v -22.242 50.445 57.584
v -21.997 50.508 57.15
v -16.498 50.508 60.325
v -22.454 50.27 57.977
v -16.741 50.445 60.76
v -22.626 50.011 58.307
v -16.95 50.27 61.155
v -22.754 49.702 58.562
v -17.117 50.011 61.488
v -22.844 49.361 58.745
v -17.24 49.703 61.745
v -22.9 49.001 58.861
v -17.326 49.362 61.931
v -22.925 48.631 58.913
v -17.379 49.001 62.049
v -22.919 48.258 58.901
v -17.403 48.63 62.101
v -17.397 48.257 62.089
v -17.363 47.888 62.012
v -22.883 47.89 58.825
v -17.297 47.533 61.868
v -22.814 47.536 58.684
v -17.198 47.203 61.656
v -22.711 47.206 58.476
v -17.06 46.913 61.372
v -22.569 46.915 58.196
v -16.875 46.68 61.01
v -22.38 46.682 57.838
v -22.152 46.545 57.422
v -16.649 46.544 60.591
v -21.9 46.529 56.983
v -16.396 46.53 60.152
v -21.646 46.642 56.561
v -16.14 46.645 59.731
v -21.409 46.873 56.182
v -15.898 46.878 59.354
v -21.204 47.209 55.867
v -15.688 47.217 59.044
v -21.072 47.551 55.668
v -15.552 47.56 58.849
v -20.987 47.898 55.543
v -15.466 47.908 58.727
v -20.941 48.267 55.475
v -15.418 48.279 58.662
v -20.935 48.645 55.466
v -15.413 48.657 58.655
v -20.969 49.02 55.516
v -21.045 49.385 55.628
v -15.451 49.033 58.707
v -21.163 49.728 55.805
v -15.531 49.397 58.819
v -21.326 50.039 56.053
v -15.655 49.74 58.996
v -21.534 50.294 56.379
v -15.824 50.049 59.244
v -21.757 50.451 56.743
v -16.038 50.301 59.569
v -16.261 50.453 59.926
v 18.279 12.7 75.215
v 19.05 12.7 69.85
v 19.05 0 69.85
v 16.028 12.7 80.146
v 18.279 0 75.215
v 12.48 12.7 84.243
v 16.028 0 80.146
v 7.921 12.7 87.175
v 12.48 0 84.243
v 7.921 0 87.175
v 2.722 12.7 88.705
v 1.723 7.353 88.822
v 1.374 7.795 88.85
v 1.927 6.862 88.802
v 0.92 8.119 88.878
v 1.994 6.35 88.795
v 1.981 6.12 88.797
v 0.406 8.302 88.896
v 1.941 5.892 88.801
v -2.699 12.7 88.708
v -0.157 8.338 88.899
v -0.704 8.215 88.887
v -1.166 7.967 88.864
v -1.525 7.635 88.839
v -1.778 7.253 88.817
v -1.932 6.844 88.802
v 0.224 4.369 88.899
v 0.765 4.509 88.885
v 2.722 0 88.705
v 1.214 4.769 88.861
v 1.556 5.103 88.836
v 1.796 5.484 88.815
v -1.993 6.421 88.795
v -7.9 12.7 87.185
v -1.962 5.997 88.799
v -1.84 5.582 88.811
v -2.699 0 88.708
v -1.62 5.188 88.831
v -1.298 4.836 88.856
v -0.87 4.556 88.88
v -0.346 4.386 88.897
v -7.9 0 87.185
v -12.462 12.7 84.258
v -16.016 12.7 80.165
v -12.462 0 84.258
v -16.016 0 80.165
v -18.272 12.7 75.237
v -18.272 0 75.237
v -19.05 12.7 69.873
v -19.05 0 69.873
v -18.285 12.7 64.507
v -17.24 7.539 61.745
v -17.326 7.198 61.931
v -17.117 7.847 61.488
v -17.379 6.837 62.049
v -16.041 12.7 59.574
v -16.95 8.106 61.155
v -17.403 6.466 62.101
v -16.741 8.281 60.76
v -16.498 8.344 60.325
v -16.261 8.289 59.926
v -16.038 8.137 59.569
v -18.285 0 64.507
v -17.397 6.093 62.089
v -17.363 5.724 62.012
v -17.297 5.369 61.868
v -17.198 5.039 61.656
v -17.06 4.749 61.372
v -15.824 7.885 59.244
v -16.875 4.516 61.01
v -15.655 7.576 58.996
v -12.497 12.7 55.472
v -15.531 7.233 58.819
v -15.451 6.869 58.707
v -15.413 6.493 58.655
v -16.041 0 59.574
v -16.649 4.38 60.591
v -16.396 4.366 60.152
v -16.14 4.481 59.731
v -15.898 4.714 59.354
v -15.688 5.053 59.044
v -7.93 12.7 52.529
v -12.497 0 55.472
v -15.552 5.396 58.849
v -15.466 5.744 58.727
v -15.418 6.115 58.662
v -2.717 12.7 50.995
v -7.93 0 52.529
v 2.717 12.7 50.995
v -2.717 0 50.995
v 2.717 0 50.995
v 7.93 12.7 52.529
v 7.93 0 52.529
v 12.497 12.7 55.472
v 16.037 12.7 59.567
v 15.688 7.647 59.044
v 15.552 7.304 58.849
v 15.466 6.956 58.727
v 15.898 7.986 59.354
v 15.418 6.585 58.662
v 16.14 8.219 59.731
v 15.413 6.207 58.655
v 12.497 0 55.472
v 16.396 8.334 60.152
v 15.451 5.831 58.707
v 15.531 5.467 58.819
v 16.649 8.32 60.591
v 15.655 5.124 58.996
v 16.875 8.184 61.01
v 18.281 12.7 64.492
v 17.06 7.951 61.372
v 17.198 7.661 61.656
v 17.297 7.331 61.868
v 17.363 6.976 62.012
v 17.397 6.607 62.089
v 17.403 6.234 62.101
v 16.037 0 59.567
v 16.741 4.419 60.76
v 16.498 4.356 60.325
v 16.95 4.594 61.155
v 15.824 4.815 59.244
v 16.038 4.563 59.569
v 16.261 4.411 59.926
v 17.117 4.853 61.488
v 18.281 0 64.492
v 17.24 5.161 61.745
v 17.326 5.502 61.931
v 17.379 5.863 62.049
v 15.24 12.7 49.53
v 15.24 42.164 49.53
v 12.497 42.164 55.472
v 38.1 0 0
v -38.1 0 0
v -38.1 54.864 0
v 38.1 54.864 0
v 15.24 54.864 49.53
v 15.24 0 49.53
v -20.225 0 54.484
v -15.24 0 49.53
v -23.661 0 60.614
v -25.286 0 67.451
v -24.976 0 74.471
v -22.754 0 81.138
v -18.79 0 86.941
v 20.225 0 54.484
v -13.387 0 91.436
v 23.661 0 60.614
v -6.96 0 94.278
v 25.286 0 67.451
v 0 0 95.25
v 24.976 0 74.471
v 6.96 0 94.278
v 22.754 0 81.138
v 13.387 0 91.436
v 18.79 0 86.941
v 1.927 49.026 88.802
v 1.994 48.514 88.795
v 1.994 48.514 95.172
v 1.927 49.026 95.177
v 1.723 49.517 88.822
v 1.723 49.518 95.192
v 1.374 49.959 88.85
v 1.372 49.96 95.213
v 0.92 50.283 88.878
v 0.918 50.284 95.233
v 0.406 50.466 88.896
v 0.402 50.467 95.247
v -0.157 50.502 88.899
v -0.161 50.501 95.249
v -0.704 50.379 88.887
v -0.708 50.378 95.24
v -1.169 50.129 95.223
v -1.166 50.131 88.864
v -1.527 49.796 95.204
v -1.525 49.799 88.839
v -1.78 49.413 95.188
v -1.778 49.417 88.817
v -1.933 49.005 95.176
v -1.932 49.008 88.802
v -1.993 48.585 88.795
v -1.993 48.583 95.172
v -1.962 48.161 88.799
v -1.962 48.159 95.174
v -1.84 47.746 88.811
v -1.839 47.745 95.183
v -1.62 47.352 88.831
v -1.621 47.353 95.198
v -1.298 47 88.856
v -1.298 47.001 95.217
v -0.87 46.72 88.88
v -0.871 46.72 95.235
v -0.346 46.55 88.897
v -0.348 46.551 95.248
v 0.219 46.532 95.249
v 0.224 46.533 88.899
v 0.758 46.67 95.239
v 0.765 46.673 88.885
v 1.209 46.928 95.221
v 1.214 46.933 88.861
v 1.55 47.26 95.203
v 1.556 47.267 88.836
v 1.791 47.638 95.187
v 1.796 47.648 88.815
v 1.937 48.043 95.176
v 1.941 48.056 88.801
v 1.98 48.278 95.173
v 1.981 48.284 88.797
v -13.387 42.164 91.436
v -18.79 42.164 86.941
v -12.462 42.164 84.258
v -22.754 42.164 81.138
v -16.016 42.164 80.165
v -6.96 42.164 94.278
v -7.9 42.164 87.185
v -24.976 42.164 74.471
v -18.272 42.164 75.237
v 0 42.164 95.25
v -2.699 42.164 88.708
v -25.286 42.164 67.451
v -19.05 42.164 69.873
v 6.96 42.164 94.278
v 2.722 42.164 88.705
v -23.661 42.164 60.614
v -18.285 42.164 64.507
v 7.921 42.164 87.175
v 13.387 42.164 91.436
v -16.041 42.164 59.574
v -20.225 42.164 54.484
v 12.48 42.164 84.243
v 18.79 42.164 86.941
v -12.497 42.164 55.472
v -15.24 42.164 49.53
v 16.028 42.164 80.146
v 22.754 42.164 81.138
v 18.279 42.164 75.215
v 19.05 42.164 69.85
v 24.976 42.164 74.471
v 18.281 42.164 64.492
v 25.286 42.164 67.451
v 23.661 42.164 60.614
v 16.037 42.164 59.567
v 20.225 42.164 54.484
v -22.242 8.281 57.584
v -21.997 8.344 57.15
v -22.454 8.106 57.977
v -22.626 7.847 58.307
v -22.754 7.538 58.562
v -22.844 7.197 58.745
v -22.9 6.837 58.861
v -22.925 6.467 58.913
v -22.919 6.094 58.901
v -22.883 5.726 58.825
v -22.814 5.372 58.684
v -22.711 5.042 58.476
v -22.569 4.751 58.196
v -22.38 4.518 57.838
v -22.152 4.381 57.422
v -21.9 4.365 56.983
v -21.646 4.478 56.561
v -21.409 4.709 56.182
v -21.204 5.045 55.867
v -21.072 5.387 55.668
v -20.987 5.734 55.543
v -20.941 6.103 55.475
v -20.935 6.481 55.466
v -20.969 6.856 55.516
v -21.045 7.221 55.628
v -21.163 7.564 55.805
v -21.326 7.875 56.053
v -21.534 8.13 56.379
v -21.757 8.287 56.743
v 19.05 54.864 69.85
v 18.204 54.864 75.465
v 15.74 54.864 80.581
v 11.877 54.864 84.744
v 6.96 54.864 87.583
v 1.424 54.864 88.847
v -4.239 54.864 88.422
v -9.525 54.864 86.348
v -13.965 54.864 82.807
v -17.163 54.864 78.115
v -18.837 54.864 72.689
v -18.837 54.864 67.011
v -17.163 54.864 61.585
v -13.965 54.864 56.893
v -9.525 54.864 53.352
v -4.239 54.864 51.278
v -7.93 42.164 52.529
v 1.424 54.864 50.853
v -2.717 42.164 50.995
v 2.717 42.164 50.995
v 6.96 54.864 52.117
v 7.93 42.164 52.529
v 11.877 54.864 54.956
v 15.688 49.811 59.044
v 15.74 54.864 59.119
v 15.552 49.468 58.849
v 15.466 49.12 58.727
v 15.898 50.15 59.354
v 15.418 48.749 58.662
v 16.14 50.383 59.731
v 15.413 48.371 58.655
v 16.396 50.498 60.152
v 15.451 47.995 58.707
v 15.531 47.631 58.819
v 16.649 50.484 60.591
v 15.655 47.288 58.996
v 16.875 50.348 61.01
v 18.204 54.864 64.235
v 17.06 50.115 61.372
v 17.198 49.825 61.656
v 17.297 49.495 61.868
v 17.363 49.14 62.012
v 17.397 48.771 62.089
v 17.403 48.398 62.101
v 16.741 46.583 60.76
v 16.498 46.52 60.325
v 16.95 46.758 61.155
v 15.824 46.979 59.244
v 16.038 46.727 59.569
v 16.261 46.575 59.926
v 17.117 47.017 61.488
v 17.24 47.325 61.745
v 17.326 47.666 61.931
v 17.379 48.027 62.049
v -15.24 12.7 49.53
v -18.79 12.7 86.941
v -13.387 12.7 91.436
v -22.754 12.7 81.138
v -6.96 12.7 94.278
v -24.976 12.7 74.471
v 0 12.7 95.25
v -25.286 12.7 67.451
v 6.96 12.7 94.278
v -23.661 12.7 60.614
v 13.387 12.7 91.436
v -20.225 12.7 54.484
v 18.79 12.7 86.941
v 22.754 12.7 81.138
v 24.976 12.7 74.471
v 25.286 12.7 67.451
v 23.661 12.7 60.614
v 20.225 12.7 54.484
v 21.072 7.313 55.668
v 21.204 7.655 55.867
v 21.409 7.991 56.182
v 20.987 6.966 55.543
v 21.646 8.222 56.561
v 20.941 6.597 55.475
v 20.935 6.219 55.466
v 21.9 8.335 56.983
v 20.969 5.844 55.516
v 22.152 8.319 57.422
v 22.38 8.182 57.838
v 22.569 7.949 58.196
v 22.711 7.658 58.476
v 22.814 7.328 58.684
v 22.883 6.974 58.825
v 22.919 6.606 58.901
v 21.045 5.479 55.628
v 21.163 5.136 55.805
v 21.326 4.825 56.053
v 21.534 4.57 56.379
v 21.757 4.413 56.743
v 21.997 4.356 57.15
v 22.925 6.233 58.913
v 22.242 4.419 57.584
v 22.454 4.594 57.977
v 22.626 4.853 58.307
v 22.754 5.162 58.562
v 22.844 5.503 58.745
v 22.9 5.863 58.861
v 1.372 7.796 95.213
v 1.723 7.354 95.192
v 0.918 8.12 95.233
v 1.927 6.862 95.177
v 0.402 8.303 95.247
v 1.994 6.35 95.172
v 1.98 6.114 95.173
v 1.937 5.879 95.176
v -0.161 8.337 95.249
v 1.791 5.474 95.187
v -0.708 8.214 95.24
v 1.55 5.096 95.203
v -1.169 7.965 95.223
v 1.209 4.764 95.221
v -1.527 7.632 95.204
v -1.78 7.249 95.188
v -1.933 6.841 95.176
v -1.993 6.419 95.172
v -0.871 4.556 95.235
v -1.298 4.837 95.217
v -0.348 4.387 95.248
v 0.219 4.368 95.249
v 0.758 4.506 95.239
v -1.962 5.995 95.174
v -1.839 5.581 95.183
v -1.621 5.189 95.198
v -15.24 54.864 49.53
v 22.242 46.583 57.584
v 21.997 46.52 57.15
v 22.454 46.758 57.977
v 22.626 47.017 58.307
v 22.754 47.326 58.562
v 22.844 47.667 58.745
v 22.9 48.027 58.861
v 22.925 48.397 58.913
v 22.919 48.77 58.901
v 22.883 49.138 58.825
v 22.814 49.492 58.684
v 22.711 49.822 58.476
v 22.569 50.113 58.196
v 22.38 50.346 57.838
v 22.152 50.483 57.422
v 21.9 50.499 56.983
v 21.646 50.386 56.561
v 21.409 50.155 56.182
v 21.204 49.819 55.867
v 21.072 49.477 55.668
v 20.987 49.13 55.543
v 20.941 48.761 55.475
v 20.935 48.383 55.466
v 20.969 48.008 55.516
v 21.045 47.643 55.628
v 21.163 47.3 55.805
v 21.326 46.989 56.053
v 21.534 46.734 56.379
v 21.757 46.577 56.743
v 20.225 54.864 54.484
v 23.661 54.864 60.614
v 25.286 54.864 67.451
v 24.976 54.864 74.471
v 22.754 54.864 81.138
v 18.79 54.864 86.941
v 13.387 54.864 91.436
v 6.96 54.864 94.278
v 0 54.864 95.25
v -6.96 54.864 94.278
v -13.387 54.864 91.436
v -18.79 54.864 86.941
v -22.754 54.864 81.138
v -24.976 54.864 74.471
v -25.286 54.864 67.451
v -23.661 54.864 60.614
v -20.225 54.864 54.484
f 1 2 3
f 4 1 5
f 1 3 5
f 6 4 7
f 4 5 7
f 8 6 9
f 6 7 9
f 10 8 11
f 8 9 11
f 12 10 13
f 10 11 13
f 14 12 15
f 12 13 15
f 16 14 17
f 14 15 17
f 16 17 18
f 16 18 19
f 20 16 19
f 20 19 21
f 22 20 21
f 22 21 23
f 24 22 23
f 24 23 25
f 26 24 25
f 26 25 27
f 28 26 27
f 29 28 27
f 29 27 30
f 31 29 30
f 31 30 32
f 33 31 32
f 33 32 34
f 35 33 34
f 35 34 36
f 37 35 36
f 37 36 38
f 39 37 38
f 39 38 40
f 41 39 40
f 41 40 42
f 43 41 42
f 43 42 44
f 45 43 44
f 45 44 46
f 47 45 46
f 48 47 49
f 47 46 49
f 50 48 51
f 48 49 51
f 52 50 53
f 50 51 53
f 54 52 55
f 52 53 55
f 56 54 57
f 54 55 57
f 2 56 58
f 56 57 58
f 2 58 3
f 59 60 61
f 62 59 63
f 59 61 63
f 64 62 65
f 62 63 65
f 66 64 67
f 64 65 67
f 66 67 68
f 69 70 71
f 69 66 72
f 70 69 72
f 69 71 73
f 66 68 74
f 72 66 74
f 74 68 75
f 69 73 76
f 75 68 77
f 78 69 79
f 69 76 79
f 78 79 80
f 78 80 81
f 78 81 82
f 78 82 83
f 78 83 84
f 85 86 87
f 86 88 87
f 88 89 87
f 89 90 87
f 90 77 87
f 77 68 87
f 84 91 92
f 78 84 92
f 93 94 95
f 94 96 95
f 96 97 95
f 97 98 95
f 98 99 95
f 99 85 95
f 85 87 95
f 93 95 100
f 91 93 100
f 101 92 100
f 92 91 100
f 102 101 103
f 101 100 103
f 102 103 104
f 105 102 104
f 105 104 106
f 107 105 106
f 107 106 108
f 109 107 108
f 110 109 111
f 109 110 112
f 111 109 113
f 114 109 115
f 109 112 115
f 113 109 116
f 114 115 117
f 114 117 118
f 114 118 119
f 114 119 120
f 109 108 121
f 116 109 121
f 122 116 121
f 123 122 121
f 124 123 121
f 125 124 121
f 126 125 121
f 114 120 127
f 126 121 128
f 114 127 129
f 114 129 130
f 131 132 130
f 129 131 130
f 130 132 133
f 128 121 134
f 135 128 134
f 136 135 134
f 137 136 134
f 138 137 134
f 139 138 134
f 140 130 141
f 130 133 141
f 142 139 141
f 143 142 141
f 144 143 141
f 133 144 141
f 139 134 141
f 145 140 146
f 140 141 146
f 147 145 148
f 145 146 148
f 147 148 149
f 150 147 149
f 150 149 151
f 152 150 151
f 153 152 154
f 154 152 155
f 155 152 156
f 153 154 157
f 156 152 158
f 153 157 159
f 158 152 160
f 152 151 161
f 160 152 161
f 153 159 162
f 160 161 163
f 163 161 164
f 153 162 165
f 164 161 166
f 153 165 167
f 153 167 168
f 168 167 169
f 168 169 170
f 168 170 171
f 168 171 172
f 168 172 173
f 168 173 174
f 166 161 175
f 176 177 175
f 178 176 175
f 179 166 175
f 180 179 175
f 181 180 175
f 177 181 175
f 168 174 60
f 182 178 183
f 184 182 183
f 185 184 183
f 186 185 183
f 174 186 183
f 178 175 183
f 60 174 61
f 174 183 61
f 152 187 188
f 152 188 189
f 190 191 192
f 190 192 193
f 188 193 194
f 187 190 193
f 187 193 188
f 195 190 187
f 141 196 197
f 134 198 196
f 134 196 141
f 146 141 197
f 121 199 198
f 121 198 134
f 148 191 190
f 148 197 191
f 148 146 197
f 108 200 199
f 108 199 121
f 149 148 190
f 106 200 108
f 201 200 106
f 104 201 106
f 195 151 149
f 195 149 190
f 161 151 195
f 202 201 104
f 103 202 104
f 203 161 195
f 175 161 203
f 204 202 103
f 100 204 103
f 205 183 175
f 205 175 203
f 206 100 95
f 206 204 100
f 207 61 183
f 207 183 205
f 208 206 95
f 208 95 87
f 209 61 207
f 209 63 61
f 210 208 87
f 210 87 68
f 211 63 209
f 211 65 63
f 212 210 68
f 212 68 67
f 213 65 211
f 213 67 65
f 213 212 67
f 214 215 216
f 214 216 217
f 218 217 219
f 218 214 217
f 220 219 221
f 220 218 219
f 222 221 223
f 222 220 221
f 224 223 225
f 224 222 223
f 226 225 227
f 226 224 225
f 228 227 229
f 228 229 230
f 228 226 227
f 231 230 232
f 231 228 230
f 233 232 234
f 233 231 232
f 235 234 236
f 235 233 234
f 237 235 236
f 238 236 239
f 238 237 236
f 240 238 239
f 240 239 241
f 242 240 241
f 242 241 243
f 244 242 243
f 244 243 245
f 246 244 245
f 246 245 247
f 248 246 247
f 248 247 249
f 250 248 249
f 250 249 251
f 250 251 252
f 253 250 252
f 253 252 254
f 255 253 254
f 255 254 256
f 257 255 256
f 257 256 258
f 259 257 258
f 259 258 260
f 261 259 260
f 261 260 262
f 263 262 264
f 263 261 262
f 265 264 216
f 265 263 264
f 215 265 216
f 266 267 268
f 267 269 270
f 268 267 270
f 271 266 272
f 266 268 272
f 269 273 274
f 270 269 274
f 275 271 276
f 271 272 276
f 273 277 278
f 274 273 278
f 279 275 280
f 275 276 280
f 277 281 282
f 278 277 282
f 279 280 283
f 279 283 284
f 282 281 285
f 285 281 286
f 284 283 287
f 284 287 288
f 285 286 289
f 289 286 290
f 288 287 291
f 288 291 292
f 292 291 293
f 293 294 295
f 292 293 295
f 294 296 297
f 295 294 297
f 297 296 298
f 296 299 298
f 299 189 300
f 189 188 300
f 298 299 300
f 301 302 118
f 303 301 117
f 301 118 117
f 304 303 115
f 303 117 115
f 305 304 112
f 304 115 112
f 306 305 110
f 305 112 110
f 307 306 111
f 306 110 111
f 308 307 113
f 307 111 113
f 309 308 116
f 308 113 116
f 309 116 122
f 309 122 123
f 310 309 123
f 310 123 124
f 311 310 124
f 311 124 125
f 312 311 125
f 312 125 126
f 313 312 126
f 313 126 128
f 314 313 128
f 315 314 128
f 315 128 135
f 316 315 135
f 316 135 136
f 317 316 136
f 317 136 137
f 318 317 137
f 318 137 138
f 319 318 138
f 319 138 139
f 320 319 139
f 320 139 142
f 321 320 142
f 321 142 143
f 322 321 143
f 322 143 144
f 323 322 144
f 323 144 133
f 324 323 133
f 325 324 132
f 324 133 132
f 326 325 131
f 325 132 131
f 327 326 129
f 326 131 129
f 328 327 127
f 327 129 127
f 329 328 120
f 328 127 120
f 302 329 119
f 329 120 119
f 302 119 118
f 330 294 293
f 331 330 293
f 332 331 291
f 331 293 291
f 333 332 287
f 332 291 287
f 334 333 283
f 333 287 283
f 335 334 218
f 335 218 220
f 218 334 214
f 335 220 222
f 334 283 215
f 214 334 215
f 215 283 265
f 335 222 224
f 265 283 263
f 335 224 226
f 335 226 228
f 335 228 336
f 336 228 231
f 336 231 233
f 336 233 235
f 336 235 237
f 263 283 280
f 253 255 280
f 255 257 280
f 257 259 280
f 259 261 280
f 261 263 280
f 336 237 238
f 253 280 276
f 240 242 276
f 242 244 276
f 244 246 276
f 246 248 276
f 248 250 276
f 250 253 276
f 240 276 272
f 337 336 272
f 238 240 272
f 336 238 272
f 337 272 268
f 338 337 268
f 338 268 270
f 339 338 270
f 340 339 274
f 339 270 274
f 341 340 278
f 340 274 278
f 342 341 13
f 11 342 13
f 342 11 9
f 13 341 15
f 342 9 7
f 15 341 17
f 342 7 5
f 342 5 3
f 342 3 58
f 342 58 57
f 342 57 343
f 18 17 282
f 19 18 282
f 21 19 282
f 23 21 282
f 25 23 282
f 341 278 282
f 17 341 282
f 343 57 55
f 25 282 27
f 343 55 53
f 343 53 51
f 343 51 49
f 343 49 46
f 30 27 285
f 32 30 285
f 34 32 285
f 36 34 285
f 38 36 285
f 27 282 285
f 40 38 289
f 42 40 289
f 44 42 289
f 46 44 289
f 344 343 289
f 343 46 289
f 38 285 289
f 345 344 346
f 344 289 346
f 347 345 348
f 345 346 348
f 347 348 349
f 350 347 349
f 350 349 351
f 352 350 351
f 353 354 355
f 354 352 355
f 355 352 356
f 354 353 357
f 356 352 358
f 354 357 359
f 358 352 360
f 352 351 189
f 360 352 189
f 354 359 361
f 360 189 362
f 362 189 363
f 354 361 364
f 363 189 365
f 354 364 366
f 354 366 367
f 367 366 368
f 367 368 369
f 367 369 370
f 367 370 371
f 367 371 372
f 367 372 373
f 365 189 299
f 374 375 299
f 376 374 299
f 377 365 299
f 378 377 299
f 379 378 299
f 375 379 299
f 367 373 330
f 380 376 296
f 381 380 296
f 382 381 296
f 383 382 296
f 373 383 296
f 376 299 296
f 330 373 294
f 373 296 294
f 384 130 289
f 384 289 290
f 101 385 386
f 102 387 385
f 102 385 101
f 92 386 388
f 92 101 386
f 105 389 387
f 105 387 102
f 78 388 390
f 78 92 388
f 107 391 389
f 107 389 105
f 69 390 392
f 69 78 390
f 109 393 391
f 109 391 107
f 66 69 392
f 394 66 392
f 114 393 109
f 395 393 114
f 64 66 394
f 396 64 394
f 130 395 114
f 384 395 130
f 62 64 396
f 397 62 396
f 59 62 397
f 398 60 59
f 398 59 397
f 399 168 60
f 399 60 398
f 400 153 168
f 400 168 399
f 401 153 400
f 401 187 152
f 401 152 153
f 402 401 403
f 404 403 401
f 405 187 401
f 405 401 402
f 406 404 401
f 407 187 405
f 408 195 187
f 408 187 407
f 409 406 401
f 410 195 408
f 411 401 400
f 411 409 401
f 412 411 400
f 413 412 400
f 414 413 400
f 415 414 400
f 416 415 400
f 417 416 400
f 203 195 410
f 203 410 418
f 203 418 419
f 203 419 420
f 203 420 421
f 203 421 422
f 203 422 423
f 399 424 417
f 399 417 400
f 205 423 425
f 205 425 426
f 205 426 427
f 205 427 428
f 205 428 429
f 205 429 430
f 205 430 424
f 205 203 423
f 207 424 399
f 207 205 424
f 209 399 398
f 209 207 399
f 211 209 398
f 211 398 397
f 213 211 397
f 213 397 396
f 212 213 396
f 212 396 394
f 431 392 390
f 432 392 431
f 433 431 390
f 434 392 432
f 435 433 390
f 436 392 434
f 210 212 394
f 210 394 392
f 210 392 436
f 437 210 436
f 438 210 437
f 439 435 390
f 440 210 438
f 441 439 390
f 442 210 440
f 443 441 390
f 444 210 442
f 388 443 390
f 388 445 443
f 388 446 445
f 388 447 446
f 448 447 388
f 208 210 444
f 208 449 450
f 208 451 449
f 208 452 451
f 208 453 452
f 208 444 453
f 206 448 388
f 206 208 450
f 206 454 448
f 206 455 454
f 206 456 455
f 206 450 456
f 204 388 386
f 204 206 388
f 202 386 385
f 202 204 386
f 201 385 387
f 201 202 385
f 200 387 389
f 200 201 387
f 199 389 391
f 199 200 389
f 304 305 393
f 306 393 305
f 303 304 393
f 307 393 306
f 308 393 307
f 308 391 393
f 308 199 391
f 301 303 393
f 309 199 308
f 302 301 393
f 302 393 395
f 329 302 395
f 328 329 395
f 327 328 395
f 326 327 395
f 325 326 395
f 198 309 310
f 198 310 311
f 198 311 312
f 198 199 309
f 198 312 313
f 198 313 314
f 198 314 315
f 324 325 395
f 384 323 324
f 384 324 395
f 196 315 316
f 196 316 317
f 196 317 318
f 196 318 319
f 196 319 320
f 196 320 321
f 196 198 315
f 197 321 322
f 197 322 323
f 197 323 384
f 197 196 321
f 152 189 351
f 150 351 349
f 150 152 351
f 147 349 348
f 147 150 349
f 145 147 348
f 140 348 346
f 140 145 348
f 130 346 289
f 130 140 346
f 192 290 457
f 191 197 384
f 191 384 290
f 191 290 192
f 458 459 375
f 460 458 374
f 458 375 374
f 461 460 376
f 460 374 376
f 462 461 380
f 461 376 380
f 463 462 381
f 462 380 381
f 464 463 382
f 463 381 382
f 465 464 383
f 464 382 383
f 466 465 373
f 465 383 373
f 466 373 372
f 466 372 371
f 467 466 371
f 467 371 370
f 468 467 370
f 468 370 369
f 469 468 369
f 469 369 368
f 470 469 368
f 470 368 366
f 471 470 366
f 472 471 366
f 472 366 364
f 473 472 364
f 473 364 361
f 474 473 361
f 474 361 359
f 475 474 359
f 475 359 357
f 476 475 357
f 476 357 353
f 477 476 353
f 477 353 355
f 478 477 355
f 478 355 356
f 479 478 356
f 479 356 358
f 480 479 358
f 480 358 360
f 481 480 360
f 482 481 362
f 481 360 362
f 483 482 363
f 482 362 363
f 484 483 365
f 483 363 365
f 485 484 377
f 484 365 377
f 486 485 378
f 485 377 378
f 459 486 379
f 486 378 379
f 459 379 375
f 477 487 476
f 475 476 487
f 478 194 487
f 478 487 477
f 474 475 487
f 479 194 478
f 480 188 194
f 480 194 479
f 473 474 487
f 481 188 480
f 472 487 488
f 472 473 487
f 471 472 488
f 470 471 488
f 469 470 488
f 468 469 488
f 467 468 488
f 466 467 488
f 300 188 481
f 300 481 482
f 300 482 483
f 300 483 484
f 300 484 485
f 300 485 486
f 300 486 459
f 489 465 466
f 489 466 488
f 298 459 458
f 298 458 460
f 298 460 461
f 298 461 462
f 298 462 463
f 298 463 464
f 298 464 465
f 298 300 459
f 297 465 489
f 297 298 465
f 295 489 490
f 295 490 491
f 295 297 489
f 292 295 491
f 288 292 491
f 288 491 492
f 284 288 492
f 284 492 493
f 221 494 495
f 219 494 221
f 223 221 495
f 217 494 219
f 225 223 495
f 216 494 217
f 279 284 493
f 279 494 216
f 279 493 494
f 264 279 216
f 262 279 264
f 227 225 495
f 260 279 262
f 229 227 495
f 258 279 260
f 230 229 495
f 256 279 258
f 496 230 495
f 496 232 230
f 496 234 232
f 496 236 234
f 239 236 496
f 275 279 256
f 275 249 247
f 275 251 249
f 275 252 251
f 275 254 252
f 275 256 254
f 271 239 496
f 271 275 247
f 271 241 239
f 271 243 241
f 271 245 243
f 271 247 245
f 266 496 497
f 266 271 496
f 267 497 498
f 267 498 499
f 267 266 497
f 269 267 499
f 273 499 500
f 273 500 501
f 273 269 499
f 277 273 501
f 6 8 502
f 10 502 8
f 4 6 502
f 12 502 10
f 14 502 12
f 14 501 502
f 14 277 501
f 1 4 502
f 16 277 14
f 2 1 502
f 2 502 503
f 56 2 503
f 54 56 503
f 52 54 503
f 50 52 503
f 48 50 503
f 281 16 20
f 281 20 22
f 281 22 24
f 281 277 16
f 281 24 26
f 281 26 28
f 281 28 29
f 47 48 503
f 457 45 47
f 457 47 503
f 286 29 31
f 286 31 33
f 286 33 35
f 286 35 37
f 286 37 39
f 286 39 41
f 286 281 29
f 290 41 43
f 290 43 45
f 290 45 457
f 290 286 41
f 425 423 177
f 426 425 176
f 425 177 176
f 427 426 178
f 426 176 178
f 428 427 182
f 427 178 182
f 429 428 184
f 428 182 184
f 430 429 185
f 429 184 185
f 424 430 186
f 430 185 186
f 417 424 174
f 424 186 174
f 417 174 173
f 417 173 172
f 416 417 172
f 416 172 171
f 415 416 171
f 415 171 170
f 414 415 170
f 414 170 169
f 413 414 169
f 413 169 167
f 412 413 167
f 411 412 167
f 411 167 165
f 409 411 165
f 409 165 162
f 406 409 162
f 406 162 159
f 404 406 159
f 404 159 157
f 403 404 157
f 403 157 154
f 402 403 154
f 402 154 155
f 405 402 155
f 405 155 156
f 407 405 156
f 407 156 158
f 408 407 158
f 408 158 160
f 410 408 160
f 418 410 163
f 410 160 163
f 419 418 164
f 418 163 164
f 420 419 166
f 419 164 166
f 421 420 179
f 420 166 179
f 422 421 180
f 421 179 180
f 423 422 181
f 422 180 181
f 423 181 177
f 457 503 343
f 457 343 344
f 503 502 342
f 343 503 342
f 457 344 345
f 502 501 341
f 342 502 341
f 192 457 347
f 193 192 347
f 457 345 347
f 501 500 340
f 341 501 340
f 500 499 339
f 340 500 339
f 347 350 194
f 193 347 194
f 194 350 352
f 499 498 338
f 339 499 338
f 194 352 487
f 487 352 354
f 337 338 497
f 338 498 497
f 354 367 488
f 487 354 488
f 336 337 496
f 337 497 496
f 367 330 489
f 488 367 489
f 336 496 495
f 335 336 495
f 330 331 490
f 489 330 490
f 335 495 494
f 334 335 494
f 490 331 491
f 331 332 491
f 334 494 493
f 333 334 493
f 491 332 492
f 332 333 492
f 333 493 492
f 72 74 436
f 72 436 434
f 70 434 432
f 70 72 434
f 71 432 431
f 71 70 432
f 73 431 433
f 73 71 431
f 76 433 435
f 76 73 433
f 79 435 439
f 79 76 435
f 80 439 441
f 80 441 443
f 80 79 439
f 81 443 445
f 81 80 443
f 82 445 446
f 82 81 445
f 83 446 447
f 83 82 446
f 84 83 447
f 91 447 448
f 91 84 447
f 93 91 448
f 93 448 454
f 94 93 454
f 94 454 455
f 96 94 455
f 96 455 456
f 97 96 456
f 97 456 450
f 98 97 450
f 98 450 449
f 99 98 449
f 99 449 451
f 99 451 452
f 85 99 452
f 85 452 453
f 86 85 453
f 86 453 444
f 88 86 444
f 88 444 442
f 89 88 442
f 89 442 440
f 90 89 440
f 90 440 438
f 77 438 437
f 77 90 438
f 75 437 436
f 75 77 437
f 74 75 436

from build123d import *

# Parameters (mm, degrees)
F0_R      = 19.05
F1_DEPTH  = 54.864
F3_W      = 76.2
F3_H      = 29.464
F4_DEPTH  = 82.551
F9_R      = 1.9939
F10_DEPTH = 25.401
F11_R     = 1.9939
F12_DEPTH = 67.921568
F13_R     = 1.9939
F14_DEPTH = 67.921568
F17_DEPTH = 42.164


with BuildPart() as f1:
    # F0 (on Front) → F1 (new body)
    with BuildSketch(Plane.XZ):
        with BuildLine():
            Line((38.1, 0), (15.24, 49.53))
            ThreePointArc((15.24, 49.53), (0, 95.25), (-15.24, 49.53))
            Line((-15.24, 49.53), (-38.1, 0))
            Line((-38.1, 0), (38.1, 0))
        make_face()
        with Locations((0, 69.85)):
            Circle(F0_R, mode=Mode.SUBTRACT)
    extrude(amount=-F1_DEPTH)

    # F3 (on offset) → F4 (cut, through all)
    with BuildSketch(Plane.XY.offset(12.7)):
        with Locations((0, 27.432)):
            Rectangle(F3_W, F3_H)
    extrude(amount=F4_DEPTH, mode=Mode.SUBTRACT)

    # F9 (on face) → F10 (cut, through all)
    with BuildSketch(Plane.XY.offset(69.85)):
        with Locations((0, 6.35)):
            Circle(F9_R)
        with Locations((0, 48.514)):
            Circle(F9_R)
    extrude(amount=F10_DEPTH, mode=Mode.SUBTRACT)

    # F11 (on face) → F12 (cut, through all)
    with BuildSketch(Plane(origin=(30.245937, 0, 17.4625), x_dir=(0, 1, 0), z_dir=(0.866025, 0, 0.5))):
        with Locations((6.35, 60.491874)):
            Circle(F11_R)
        with Locations((48.514, 60.491874)):
            Circle(F11_R)
    extrude(amount=-F12_DEPTH, mode=Mode.SUBTRACT)

    # F13 (on face) → F14 (cut, through all)
    with BuildSketch(Plane(origin=(-30.245937, 0, 17.4625), x_dir=(0, -1, 0), z_dir=(-0.866025, 0, 0.5))):
        with Locations((-48.514, 60.491874)):
            Circle(F13_R)
        with Locations((-6.35, 60.491874)):
            Circle(F13_R)
    extrude(amount=-F14_DEPTH, mode=Mode.SUBTRACT)

    # F16 (on face) → F17 (join, through all)
    with BuildSketch(Plane.XZ):
        with BuildLine():
            Line((-12.497391, 55.472319), (-15.24, 49.53))
            Line((-15.24, 49.53), (-38.1, 0))
            Line((-38.1, 0), (38.1, 0))
            Line((38.1, 0), (15.24, 49.53))
            Line((15.24, 49.53), (12.497391, 55.472319))
            ThreePointArc((12.497391, 55.472319), (0, 50.8), (-12.497391, 55.472319))
        make_face()
    extrude(amount=-F17_DEPTH)


solid = f1.part
